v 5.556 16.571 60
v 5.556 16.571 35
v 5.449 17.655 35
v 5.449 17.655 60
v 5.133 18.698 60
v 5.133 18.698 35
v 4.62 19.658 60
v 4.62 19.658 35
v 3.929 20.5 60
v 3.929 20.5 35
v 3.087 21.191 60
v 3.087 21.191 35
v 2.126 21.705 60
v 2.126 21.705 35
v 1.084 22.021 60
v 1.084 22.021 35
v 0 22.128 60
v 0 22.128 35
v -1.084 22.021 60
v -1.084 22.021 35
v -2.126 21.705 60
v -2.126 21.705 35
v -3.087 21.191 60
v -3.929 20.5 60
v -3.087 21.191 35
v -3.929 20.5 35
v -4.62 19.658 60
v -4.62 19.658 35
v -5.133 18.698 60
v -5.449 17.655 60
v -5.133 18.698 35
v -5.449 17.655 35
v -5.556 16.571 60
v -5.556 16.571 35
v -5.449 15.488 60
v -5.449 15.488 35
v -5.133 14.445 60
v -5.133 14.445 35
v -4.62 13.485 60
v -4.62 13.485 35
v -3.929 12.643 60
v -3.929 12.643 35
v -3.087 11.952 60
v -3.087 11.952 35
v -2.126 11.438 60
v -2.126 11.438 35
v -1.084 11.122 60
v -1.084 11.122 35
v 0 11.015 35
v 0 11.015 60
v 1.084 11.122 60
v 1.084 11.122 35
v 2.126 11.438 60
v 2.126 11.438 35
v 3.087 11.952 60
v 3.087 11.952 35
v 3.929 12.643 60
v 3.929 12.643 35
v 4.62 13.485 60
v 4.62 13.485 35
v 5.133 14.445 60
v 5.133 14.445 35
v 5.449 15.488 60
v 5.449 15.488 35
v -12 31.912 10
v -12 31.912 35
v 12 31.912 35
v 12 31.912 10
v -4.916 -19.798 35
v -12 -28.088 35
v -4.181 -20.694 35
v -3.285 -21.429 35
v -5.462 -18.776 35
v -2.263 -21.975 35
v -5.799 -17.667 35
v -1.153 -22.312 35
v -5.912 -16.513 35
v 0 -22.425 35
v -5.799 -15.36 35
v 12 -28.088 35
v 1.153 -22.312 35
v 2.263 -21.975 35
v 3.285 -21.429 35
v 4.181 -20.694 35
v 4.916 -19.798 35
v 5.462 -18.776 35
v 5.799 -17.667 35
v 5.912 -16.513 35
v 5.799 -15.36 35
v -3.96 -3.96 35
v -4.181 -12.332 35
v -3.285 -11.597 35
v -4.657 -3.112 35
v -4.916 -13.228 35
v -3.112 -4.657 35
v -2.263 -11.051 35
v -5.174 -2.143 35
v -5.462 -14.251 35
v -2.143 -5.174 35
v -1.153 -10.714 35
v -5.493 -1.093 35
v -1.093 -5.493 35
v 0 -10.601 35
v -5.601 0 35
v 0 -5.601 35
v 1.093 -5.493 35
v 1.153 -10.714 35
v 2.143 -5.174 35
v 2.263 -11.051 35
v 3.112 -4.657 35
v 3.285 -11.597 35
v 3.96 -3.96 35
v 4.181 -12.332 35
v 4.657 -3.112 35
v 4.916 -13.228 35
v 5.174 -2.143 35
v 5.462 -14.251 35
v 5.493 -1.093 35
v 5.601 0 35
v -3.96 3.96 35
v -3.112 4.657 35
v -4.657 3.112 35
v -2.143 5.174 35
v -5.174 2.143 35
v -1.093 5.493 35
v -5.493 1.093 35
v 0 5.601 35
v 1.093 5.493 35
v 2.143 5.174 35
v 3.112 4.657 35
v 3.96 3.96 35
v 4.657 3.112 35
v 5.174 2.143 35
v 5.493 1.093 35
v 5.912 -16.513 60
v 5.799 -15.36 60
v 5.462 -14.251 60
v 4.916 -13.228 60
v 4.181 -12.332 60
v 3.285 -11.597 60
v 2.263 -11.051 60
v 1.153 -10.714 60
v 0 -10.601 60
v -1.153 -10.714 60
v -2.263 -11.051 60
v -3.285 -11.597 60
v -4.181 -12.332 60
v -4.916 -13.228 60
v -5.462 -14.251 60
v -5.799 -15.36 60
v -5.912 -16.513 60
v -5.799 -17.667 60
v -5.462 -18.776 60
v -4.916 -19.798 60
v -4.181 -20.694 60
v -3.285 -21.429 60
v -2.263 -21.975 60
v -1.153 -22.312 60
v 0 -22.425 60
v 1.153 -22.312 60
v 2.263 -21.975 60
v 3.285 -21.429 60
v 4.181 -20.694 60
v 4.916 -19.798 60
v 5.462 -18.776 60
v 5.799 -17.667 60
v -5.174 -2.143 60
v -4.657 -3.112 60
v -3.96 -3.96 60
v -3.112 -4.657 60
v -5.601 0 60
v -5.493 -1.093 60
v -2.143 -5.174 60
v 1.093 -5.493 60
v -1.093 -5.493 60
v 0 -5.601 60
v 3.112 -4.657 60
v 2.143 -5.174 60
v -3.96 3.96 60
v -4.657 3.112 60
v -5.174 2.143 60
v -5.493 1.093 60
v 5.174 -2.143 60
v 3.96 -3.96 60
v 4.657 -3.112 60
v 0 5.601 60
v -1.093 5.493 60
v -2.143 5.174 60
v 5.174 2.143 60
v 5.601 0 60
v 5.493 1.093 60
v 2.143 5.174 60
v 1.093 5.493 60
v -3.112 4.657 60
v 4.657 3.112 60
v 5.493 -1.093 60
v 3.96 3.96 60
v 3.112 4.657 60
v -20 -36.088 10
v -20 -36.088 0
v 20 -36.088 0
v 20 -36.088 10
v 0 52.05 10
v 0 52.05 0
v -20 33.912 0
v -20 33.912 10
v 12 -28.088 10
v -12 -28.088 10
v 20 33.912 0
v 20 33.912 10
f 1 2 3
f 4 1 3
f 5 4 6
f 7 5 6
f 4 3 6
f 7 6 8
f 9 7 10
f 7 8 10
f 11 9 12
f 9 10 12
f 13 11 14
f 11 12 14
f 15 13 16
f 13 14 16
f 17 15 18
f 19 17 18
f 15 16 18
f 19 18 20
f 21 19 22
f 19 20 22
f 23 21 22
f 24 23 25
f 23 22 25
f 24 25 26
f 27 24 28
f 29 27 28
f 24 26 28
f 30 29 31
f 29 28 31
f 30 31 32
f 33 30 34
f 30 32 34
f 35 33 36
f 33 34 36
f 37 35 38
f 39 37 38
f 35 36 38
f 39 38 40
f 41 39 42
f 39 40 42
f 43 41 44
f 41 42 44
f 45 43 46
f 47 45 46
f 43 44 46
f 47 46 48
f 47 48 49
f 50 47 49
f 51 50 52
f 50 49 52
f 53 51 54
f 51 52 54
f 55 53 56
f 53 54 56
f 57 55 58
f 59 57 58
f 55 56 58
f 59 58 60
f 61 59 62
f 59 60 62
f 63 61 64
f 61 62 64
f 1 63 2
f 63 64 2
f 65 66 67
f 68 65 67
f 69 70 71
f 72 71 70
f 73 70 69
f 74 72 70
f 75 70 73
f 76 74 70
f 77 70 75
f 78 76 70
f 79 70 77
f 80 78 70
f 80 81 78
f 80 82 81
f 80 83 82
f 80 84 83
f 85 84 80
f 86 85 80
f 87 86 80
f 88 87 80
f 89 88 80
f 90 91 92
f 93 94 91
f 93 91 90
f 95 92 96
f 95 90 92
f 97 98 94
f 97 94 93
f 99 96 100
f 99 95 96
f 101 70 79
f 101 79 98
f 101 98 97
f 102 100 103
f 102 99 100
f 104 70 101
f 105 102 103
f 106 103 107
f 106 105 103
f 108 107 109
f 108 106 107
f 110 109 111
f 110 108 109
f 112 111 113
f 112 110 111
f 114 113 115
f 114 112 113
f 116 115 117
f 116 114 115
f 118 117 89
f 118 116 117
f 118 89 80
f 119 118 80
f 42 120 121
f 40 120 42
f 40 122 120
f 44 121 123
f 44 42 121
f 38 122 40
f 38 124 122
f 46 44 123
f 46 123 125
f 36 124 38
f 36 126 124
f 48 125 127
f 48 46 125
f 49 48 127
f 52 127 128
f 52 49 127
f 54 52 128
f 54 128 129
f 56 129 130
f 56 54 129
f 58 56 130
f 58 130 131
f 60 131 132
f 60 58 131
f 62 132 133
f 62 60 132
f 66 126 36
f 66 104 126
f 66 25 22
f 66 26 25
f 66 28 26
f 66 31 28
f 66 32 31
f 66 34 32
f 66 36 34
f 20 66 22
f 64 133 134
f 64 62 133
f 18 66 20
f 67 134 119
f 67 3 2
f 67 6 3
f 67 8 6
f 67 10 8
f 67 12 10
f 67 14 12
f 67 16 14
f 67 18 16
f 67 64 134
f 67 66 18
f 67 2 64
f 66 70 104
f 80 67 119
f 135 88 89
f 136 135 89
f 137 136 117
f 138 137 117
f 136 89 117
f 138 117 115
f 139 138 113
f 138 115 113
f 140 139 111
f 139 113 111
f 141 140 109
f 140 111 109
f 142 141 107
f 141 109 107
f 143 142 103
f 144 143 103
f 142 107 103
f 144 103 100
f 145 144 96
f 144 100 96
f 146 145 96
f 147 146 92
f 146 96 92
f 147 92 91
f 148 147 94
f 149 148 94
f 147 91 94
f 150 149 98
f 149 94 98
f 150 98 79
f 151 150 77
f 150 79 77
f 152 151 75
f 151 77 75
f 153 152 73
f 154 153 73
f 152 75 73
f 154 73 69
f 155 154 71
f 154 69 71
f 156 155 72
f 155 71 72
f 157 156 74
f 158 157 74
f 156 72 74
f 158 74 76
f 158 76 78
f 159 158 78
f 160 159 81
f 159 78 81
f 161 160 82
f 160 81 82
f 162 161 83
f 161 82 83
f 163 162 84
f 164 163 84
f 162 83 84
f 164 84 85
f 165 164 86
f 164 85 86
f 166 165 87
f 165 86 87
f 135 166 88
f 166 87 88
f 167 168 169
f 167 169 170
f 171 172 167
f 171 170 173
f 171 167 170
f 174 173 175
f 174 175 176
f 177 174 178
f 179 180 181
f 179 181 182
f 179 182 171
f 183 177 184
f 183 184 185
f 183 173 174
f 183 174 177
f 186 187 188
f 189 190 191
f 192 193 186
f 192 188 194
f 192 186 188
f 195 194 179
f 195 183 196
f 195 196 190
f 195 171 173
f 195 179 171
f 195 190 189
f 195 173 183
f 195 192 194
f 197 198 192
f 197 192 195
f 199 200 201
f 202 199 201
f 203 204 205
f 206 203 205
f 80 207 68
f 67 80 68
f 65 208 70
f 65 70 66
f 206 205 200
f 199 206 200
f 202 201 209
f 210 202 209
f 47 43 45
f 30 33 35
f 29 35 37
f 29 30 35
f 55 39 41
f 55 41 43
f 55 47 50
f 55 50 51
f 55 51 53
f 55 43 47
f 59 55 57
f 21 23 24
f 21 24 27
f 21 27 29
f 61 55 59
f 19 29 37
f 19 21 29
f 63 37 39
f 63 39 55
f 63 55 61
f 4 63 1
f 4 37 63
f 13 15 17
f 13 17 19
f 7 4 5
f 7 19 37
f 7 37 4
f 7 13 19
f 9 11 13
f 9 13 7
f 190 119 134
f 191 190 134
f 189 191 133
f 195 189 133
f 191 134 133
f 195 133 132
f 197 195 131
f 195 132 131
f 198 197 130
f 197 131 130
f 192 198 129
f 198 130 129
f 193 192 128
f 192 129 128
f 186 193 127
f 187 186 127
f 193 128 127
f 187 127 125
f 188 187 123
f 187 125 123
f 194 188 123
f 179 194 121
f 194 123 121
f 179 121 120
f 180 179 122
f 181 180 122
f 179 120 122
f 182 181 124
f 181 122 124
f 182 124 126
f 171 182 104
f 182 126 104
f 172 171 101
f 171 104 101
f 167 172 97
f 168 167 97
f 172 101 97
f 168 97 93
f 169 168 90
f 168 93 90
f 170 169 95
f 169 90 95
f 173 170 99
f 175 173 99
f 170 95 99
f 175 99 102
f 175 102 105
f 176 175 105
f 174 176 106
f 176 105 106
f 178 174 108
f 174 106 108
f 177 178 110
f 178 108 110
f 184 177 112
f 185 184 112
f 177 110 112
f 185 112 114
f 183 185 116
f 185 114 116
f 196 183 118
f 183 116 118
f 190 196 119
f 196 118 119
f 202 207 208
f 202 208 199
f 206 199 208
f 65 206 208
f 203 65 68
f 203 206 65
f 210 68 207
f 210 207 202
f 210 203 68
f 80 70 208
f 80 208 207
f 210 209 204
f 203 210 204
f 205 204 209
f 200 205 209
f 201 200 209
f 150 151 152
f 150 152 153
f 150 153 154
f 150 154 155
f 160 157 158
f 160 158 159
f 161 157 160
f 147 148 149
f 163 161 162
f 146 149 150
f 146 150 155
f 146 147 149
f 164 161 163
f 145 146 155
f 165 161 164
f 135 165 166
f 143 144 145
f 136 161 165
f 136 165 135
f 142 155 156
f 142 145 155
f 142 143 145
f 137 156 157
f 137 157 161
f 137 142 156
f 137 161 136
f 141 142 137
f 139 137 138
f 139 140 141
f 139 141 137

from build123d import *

# Parameters (mm, degrees)
F1_DEPTH = 10
F2_W     = 24
F2_H     = 60
F3_DEPTH = 25
F4_R     = 5.556235
F4_R_2   = 5.60079
F4_R_3   = 5.912316
F5_DEPTH = 25


with BuildPart() as f1:
    # F0 (on Top) → F1 (new body)
    with BuildSketch(Plane.XY):
        Polygon((0, 52.050263), (-20, 33.911906), (-20, -36.088094), (20, -36.088094), (20, 33.911906), align=None)
    extrude(amount=F1_DEPTH)

    # F2 (on face) → F3 (join)
    with BuildSketch(Plane.XY.offset(10)):
        with Locations((0, 1.911906)):
            Rectangle(F2_W, F2_H)
    extrude(amount=F3_DEPTH)

    # F4 (on face) → F5 (join)
    with BuildSketch(Plane.XY.offset(35)):
        with Locations((0, 16.571494)):
            Circle(F4_R)
        Circle(F4_R_2)
        with Locations((0, -16.513106)):
            Circle(F4_R_3)
    extrude(amount=F5_DEPTH)


solid = f1.part
